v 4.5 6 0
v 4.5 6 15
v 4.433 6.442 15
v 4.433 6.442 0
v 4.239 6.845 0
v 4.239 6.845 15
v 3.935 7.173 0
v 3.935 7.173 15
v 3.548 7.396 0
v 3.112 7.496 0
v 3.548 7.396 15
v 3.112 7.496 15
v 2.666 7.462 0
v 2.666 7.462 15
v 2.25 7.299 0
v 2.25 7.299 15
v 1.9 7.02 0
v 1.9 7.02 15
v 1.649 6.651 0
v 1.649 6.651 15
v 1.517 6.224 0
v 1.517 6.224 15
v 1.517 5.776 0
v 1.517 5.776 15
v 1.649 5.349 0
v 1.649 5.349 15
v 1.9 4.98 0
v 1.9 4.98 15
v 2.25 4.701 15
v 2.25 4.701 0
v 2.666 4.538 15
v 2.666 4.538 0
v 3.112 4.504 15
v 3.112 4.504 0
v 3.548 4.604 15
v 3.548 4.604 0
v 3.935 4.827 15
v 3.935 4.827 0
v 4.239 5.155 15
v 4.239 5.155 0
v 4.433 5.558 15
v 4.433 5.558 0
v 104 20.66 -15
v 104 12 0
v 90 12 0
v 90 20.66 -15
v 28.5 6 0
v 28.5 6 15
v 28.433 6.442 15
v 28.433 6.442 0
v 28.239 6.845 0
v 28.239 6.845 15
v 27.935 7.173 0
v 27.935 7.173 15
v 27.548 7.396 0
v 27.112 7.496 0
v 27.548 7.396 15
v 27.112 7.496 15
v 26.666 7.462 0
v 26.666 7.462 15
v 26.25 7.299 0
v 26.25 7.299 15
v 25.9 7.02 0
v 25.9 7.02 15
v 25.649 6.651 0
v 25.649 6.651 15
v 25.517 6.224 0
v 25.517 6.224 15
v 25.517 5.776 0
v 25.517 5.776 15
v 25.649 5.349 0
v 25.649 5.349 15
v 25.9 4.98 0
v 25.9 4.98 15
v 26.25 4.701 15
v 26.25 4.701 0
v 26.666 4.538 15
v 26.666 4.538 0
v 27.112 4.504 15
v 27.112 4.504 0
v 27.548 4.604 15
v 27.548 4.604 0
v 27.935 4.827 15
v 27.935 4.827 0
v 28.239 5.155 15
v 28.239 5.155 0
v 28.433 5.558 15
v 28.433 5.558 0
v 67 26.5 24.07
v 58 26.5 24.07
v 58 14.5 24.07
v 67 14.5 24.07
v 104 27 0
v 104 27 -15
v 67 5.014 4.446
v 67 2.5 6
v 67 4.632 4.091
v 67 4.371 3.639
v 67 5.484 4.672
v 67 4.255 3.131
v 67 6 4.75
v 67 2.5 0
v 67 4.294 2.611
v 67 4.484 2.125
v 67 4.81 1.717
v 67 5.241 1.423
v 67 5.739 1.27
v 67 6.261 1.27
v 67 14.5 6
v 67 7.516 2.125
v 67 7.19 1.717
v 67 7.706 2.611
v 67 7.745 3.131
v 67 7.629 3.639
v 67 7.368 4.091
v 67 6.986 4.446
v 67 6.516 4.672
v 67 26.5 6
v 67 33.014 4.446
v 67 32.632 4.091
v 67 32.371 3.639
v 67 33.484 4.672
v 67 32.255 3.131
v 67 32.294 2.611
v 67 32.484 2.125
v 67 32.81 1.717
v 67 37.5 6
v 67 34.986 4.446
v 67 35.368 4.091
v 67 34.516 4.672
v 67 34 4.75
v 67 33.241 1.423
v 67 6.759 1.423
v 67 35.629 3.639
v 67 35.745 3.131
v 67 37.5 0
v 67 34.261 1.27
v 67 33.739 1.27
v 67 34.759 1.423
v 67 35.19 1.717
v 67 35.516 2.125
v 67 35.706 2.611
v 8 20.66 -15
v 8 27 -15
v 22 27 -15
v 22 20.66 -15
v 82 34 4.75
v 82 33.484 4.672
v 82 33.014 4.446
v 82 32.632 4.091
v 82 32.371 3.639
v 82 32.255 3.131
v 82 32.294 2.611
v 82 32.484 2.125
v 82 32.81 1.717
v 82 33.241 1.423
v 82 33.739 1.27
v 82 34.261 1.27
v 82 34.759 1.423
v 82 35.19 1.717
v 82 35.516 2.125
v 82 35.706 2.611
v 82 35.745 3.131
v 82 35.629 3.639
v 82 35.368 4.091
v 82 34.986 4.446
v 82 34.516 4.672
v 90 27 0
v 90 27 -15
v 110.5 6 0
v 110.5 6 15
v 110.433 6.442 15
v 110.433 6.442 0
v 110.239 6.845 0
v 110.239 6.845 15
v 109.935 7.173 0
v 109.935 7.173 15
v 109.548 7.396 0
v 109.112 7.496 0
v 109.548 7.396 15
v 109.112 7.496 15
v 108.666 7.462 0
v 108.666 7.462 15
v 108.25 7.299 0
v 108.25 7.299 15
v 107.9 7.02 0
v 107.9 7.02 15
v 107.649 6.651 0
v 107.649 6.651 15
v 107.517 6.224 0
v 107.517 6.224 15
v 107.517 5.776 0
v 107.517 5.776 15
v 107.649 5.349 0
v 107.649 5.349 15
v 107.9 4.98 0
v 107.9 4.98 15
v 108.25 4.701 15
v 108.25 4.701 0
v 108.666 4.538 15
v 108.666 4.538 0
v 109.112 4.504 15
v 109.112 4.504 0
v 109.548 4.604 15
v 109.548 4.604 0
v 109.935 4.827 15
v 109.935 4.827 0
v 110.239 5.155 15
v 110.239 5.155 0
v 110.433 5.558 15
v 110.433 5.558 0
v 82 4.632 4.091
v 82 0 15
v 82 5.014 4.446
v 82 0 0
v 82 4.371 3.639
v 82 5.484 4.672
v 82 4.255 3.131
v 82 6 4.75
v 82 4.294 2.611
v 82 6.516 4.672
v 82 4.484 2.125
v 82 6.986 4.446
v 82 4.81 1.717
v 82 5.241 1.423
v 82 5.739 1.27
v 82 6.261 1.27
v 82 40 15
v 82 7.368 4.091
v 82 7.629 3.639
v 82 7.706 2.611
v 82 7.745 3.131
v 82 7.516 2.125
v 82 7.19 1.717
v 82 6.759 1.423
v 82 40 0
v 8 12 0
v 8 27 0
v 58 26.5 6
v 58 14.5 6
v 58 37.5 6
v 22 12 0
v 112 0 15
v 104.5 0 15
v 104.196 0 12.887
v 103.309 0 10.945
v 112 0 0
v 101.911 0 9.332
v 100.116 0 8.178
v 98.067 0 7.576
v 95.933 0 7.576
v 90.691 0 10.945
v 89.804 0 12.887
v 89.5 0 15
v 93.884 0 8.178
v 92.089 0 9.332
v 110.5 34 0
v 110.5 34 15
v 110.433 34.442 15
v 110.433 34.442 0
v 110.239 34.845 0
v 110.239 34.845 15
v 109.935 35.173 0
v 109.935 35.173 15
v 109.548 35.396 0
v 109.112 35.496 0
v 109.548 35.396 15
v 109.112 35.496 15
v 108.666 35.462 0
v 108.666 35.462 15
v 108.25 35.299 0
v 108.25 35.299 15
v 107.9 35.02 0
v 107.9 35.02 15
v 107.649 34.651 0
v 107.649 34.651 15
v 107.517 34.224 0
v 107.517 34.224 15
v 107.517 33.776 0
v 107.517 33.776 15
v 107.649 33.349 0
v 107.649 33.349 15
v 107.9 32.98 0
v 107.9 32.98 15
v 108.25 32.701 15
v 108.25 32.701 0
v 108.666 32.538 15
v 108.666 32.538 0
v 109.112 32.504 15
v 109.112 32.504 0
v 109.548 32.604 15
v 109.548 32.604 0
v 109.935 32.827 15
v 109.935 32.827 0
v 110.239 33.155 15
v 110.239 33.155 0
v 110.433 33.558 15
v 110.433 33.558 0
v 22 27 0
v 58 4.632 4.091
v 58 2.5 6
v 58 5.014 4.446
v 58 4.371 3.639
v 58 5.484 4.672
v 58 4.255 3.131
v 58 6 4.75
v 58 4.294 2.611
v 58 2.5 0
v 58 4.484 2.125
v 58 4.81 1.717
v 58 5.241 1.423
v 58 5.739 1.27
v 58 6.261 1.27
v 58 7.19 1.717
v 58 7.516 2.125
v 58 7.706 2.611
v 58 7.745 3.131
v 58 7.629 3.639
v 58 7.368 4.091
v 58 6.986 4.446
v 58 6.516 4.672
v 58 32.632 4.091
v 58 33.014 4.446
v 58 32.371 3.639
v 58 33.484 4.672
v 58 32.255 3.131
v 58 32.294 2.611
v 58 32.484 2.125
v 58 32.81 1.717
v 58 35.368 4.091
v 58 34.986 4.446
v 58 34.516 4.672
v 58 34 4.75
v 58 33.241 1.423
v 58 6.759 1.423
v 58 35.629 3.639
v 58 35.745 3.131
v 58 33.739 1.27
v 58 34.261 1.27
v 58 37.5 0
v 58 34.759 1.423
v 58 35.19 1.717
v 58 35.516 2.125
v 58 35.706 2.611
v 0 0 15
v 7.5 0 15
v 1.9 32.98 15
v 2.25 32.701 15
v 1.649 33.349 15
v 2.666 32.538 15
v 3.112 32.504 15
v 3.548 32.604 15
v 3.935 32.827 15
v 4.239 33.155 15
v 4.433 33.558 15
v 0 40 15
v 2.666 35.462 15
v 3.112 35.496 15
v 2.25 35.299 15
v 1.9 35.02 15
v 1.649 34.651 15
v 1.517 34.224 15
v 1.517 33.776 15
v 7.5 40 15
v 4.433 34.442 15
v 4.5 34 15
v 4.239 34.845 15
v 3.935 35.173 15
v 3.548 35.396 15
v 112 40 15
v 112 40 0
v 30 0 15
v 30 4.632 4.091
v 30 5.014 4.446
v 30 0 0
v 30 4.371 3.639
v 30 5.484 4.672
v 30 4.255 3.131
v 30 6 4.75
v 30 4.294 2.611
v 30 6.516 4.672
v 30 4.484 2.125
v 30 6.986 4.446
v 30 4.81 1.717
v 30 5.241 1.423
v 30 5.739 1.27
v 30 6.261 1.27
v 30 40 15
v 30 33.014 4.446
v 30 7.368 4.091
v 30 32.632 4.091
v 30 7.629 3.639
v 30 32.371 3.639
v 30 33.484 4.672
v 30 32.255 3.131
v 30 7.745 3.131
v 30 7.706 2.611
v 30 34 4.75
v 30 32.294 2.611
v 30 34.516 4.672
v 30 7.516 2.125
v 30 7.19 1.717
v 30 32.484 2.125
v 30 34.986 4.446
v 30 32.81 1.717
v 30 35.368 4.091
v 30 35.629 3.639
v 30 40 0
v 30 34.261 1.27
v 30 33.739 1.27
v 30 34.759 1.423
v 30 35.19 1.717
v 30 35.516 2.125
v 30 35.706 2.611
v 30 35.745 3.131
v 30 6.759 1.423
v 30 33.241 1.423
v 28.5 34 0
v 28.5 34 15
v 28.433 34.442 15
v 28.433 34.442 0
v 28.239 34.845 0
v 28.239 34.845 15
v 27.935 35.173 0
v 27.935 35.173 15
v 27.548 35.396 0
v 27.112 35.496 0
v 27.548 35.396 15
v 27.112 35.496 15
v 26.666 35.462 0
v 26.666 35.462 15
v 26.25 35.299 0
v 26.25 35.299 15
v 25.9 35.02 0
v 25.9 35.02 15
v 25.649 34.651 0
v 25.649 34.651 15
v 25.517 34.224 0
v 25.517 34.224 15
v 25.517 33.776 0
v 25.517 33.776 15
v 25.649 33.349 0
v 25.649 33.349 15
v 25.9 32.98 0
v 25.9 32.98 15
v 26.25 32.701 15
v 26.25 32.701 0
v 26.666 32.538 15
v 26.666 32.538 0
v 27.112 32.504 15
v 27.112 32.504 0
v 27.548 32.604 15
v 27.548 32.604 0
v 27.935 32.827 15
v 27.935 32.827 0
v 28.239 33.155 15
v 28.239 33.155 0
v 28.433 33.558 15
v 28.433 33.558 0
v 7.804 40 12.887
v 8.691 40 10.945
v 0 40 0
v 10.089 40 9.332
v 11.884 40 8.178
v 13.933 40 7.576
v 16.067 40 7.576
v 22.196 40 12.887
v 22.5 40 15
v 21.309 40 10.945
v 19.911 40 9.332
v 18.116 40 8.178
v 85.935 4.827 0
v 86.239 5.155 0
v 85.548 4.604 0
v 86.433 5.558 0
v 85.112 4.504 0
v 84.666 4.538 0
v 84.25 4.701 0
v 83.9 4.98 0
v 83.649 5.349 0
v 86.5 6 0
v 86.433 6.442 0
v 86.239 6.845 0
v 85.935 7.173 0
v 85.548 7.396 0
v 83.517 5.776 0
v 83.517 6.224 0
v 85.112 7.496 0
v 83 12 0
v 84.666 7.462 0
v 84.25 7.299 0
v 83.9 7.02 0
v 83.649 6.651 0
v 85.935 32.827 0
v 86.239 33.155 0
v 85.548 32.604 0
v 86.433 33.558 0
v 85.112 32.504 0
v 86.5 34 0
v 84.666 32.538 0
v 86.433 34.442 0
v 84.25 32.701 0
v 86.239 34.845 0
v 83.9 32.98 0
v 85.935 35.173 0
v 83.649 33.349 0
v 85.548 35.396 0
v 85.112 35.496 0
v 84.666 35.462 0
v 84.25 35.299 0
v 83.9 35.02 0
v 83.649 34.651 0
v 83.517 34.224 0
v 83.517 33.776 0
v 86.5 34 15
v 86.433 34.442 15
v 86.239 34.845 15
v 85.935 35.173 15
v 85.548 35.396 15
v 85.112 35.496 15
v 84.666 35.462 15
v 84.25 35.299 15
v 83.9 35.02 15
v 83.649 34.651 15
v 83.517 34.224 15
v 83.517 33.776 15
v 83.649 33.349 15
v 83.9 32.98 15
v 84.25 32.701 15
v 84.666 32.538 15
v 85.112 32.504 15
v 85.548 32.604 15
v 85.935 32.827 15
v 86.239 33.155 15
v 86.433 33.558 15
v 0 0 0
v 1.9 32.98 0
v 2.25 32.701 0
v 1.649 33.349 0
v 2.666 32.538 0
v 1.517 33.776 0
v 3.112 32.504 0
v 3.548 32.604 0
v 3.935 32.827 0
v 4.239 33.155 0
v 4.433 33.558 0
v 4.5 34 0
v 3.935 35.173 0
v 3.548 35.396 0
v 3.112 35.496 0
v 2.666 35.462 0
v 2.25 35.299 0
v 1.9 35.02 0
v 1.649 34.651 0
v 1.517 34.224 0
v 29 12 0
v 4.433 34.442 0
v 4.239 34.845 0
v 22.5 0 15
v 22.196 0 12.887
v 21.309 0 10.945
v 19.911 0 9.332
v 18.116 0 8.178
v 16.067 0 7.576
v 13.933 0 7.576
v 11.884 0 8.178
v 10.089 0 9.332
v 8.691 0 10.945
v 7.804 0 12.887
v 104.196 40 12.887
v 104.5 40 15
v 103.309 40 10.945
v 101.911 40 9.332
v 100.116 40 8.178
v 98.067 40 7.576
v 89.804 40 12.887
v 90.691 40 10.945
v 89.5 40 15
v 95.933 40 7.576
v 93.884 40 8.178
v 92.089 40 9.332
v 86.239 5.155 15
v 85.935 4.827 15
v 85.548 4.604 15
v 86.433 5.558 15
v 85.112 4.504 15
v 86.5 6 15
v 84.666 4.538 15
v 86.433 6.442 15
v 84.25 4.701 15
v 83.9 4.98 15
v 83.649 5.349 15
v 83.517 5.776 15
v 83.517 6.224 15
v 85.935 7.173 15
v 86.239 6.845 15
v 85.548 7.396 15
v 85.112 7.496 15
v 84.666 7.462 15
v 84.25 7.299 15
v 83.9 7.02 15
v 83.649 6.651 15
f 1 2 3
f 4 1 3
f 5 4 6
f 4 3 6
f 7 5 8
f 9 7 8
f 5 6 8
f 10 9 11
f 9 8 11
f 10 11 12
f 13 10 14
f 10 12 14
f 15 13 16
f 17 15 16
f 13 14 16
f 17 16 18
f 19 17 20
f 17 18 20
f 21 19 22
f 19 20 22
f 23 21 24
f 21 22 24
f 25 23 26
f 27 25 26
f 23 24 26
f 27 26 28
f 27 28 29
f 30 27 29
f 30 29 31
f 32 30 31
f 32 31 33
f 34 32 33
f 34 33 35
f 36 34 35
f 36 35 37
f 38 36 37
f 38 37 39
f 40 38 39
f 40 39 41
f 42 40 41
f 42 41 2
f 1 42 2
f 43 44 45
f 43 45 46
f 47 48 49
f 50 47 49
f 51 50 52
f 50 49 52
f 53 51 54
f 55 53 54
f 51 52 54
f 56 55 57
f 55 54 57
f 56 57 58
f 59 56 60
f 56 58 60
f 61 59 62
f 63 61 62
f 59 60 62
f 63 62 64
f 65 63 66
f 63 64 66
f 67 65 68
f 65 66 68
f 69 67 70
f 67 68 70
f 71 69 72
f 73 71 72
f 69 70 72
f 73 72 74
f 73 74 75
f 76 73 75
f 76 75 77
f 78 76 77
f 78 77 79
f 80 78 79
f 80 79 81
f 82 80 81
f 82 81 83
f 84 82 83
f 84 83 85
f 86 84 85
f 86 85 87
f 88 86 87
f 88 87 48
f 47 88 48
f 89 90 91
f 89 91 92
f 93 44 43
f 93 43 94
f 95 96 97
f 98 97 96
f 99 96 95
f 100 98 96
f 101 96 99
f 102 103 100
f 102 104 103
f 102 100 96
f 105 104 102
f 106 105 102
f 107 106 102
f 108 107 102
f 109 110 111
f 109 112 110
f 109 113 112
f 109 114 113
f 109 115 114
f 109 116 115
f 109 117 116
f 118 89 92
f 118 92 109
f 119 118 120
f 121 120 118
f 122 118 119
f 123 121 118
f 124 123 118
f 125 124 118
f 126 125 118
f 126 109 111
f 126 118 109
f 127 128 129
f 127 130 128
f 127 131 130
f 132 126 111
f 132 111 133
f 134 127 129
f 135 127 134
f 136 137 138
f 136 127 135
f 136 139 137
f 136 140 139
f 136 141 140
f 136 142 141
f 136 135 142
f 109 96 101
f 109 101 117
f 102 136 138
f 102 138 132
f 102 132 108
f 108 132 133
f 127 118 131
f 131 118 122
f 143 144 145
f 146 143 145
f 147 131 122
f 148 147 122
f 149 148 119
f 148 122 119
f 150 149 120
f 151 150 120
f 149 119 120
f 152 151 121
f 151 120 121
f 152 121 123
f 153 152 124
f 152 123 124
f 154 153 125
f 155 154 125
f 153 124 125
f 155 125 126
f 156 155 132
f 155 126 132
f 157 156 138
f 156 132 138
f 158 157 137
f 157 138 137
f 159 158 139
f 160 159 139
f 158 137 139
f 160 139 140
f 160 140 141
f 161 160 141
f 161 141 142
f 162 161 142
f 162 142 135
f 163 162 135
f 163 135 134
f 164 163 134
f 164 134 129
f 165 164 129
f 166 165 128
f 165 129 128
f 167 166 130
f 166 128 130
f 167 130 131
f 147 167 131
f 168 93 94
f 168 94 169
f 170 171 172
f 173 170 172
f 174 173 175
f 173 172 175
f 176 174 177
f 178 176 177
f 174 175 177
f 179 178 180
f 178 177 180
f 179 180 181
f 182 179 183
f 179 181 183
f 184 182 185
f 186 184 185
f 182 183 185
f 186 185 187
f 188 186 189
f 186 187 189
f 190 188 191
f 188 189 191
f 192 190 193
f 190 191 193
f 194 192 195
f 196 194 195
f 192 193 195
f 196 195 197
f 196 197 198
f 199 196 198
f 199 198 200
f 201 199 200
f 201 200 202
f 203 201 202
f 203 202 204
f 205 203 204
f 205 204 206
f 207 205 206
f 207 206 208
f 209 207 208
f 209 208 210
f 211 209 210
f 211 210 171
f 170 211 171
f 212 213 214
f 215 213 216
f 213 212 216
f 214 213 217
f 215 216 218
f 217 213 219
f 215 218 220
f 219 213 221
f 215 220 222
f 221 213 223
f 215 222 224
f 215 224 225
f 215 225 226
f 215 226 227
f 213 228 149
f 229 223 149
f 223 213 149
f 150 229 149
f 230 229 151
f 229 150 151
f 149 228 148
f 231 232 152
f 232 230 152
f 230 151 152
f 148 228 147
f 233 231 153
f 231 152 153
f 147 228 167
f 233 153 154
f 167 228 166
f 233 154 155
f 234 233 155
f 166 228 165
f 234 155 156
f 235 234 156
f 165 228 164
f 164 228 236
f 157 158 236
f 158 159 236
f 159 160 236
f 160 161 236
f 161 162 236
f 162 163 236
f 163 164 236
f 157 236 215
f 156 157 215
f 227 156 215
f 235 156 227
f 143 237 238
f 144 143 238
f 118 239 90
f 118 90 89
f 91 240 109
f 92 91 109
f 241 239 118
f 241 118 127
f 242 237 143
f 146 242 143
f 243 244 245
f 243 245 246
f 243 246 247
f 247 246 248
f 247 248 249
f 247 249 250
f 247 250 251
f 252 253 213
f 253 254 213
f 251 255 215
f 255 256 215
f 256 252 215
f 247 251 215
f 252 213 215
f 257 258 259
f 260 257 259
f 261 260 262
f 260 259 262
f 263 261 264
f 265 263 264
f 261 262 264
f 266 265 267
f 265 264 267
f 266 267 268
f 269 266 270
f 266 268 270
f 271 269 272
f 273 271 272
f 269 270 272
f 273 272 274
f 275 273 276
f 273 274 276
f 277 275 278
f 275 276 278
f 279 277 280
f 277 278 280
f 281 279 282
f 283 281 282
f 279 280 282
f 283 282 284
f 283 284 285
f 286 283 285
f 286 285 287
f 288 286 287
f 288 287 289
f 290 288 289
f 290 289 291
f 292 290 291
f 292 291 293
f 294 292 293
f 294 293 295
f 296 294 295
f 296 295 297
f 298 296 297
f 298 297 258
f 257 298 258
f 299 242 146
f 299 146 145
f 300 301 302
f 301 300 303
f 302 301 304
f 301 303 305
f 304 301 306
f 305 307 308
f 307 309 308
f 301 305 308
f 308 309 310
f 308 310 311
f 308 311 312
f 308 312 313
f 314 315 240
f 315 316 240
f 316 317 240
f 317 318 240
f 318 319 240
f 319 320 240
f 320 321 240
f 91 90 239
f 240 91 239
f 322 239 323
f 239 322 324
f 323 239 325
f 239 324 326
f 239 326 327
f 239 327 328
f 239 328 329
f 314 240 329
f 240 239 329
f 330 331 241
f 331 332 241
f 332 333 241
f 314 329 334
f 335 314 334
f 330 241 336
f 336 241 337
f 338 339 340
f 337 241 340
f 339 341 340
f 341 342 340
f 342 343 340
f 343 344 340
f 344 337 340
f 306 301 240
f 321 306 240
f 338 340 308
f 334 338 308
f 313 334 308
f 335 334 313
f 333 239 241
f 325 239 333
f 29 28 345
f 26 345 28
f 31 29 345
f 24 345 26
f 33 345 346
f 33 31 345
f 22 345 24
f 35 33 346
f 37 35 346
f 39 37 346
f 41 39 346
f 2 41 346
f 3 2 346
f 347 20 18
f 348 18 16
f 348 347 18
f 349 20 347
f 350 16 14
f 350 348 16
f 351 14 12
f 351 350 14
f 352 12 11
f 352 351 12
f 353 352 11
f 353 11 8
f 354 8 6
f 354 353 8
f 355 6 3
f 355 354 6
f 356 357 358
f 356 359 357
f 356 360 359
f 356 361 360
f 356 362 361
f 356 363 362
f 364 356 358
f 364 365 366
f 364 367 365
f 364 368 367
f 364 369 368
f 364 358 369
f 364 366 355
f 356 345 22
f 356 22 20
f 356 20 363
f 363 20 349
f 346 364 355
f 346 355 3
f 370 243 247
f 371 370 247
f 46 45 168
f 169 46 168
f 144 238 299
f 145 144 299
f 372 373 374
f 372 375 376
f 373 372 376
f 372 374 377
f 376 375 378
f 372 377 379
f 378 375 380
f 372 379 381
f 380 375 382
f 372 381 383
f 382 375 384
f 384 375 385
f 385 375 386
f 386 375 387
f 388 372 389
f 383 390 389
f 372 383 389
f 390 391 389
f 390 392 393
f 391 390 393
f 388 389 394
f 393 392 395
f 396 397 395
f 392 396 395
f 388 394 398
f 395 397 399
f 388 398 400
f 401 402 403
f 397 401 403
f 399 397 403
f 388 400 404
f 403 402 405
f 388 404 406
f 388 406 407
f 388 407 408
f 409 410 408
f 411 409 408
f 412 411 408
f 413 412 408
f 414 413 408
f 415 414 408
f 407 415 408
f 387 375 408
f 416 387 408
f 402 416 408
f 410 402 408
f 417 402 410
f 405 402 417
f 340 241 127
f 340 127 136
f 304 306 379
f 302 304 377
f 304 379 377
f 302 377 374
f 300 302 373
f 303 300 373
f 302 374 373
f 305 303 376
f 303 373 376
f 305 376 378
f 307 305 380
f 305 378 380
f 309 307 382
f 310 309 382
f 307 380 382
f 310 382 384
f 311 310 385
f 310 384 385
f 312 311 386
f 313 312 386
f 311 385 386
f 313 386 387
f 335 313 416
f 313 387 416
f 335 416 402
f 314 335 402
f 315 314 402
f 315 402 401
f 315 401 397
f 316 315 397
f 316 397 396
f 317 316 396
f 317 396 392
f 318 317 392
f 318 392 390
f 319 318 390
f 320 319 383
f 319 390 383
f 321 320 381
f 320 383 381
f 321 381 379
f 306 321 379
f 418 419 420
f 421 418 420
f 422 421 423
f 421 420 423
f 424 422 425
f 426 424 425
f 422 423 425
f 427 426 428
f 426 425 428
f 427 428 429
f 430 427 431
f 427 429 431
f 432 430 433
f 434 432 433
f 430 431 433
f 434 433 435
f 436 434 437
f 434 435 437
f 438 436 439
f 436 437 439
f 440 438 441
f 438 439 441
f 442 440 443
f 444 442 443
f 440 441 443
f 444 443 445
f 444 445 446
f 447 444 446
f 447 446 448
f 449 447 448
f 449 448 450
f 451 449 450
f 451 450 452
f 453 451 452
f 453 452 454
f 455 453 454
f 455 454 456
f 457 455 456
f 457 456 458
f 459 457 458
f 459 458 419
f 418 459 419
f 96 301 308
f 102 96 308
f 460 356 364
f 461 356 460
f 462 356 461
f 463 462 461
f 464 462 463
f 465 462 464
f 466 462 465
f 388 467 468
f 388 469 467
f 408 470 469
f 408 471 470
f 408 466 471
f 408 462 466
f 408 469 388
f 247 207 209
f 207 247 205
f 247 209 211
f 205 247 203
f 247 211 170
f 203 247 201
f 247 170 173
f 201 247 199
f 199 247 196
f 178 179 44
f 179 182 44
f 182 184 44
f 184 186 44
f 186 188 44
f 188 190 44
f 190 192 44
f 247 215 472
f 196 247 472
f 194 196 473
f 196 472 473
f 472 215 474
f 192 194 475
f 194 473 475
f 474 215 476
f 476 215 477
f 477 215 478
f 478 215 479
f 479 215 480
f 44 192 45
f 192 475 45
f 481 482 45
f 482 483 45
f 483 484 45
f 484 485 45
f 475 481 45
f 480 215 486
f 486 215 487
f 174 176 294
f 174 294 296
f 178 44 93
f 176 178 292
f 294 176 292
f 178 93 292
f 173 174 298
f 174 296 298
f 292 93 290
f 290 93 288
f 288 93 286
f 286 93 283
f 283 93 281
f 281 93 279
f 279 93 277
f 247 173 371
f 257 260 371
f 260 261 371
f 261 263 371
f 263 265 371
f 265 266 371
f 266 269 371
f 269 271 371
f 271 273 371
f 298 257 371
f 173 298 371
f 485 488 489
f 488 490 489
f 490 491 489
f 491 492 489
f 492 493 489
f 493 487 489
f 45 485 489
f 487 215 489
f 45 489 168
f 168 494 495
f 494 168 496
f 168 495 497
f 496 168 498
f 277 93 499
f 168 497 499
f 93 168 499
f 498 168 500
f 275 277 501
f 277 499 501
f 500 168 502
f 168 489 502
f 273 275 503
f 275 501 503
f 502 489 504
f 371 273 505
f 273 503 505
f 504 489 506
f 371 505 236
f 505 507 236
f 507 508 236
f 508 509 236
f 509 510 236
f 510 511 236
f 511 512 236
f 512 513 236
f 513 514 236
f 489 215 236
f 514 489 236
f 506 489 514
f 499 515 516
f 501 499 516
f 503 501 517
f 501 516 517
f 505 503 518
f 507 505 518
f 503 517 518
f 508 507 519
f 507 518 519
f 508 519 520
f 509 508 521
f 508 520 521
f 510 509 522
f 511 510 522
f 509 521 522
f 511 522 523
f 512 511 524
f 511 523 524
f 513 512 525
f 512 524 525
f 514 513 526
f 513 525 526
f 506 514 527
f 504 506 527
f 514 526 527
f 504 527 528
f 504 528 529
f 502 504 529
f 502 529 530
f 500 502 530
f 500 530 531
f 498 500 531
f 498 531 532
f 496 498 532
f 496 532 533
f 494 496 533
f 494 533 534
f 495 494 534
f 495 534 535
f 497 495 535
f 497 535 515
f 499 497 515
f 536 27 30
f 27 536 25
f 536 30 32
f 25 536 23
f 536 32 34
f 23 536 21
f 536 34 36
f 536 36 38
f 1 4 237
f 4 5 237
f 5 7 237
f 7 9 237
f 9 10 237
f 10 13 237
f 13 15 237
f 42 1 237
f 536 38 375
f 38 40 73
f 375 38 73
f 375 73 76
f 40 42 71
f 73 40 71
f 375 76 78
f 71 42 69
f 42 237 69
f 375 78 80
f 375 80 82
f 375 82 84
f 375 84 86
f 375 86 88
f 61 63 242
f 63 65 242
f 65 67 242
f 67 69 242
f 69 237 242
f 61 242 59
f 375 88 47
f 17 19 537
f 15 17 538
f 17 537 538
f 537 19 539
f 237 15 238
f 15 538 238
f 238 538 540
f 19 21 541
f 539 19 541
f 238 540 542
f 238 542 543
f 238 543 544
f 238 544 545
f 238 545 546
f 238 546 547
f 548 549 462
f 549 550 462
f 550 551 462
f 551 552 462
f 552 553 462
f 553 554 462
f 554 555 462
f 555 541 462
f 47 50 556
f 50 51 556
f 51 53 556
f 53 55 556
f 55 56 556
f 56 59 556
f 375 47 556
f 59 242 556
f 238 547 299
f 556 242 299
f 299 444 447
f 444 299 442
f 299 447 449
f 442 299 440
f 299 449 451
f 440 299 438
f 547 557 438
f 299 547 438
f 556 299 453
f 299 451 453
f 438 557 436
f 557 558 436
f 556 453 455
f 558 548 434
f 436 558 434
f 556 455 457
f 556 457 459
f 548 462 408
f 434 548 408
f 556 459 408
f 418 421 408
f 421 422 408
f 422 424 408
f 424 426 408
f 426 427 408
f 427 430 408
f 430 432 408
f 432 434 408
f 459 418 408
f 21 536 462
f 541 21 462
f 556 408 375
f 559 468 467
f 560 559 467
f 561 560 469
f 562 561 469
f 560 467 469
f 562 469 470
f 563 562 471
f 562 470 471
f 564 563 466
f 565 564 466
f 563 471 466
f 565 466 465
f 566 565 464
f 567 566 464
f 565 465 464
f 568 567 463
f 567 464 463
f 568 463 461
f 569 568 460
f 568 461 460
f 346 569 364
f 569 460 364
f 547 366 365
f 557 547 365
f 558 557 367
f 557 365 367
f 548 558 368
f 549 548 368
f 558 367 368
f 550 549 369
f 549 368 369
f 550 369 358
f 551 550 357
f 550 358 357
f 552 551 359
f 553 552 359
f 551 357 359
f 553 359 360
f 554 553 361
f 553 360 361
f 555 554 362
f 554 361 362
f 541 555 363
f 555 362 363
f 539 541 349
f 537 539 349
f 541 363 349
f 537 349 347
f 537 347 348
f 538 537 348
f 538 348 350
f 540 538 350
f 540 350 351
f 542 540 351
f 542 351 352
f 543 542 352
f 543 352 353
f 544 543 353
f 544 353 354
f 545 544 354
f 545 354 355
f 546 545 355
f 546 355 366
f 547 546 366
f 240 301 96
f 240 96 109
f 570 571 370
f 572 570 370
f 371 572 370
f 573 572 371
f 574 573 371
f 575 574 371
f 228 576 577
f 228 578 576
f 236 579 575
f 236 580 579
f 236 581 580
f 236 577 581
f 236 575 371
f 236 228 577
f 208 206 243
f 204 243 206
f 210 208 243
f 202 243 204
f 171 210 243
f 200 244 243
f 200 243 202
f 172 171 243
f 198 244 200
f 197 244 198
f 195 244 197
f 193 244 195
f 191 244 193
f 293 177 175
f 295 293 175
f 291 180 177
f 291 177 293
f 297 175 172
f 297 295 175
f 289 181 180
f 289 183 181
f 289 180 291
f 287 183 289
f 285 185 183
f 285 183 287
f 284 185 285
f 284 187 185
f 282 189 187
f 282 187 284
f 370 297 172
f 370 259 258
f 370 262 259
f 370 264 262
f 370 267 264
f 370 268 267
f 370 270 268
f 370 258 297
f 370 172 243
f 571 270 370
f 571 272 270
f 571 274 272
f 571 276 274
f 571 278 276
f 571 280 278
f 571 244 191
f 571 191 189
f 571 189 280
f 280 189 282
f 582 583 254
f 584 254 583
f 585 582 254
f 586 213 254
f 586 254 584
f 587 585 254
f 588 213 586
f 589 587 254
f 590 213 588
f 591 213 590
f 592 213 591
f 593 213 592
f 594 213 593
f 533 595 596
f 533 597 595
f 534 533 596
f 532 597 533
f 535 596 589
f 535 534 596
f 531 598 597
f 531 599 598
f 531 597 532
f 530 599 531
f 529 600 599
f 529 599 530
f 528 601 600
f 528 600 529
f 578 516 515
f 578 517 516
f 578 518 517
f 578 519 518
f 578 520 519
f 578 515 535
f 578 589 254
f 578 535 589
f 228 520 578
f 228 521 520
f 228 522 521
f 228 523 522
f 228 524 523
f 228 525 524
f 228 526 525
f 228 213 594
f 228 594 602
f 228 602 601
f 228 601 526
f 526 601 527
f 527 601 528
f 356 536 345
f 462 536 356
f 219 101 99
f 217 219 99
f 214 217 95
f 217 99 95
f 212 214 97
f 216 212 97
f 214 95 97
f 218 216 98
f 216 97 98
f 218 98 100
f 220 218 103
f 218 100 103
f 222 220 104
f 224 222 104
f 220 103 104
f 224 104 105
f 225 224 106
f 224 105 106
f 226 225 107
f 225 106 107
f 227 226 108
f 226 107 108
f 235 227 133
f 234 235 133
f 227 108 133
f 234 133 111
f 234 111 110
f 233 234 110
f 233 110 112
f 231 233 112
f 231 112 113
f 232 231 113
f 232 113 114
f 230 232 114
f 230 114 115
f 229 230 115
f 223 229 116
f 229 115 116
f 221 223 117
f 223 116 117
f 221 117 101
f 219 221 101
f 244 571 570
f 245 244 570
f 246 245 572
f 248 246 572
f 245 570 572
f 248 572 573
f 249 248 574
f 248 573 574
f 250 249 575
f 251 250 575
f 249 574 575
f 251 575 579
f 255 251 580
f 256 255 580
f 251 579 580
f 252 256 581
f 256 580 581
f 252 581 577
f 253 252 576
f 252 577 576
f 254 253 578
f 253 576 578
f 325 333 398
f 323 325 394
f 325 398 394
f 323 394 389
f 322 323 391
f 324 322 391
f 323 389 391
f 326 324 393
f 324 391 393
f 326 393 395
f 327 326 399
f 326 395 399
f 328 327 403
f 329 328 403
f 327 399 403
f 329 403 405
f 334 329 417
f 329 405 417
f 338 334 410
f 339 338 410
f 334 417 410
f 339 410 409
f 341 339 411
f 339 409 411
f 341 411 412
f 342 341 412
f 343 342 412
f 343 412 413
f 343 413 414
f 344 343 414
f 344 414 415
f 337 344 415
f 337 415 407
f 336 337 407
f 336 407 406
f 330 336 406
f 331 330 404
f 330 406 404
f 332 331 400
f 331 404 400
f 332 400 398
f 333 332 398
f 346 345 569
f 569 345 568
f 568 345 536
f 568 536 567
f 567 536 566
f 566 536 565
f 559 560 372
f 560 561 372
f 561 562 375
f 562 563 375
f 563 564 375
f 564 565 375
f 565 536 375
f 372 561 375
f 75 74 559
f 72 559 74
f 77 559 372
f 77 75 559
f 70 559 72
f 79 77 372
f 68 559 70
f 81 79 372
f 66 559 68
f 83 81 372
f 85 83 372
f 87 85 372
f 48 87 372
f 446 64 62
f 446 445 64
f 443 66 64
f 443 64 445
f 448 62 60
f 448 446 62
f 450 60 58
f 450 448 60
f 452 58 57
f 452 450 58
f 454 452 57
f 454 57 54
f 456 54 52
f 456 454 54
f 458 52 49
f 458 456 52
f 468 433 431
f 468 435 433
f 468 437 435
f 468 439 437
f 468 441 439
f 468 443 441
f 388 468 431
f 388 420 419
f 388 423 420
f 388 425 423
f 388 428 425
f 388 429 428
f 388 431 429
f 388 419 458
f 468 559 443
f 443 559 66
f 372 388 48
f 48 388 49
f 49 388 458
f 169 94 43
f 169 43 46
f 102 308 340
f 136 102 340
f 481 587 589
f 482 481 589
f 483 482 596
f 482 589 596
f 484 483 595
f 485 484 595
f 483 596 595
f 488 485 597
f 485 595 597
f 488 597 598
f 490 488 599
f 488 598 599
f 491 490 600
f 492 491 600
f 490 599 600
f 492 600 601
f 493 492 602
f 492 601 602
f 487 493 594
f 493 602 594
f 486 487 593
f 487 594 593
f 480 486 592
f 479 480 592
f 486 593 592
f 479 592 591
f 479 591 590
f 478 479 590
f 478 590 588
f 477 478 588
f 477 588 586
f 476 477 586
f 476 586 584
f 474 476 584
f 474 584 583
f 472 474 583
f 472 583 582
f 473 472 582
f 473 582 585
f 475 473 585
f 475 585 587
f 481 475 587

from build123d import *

# Parameters (mm, degrees)
SKETCH1_W            = 30
SKETCH1_H            = 40
BOSS_EXTRUDE1_DEPTH  = 15
CUT_EXTRUDE1_DEPTH   = 49
SKETCH3_R            = 1.5
CUT_EXTRUDE2_DEPTH   = 49
SKETCH4_R            = 1.75
BOSS_EXTRUDE2_DEPTH  = 28
SKETCH5_W            = 6
SKETCH5_H            = 35
BOSS_EXTRUDE3_DEPTH  = 9
SKETCH6_R            = 1.75
BOSS_EXTRUDE4_DEPTH  = 15
SKETCH7_W            = 15
SKETCH7_H            = 40
BOSS_EXTRUDE6_DEPTH  = 30
CUT_EXTRUDE3_DEPTH   = 59
SKETCH10_R           = 1.5
CUT_EXTRUDE4_DEPTH   = 59
SKETCH14_W           = 14
SKETCH14_H           = 15
BOSS_EXTRUDE8_DEPTH  = 15
CUT_EXTRUDE7_DEPTH   = 21
SKETCH17_W           = 9
SKETCH17_H           = 12
BOSS_EXTRUDE10_DEPTH = 18.07


with BuildPart() as part:
    # Sketch1 → Boss-Extrude1 (new body)
    with BuildSketch(Plane.XY):
        with Locations((15, 20)):
            Rectangle(SKETCH1_W, SKETCH1_H)
    extrude(amount=BOSS_EXTRUDE1_DEPTH)

    # Sketch2 → Cut-Extrude1 (cut)
    with BuildSketch(Plane(origin=(0, 40, 0), x_dir=(1, 0, 0), z_dir=(0, 1, 0))):
        with BuildLine():
            Line((7.5, -15), (22.5, -15))
            ThreePointArc((22.5, -15), (15, -7.5), (7.5, -15))
        make_face()
    extrude(amount=-CUT_EXTRUDE1_DEPTH, mode=Mode.SUBTRACT)

    # Sketch3 → Cut-Extrude2 (cut)
    with BuildSketch(Plane.XY.offset(15)):
        with Locations((3, 34)):
            Circle(SKETCH3_R)
        with Locations((3, 6)):
            Circle(SKETCH3_R)
        with Locations((27, 34)):
            Circle(SKETCH3_R)
        with Locations((27, 6)):
            Circle(SKETCH3_R)
    extrude(amount=-CUT_EXTRUDE2_DEPTH, mode=Mode.SUBTRACT)

    # Sketch4 → Boss-Extrude2 (add)
    with BuildSketch(Plane(origin=(30, 0, 0), x_dir=(0, 0, -1), z_dir=(1, 0, 0))):
        with Locations(Location((-3, 34, 0), (0, 0, 180))):
            Circle(SKETCH4_R)
        with Locations(Location((-3, 6, 0), (0, 0, 180))):
            Circle(SKETCH4_R)
    extrude(amount=BOSS_EXTRUDE2_DEPTH)

    # Sketch5 → Boss-Extrude3 (add)
    with BuildSketch(Plane(origin=(58, 0, 0), x_dir=(0, 0, -1), z_dir=(1, 0, 0))):
        with Locations((-3, 20)):
            Rectangle(SKETCH5_W, SKETCH5_H)
    extrude(amount=BOSS_EXTRUDE3_DEPTH)

    # Sketch6 → Boss-Extrude4 (add)
    with BuildSketch(Plane(origin=(67, 0, 0), x_dir=(0, 0, -1), z_dir=(1, 0, 0))):
        with Locations(Location((-3, 34, 0), (0, 0, 180))):
            Circle(SKETCH6_R)
        with Locations(Location((-3, 6, 0), (0, 0, 180))):
            Circle(SKETCH6_R)
    extrude(amount=BOSS_EXTRUDE4_DEPTH)

    # Sketch7 → Boss-Extrude6 (add)
    with BuildSketch(Plane(origin=(82, 0, 0), x_dir=(0, 0, -1), z_dir=(1, 0, 0))):
        with Locations((-7.5, 20)):
            Rectangle(SKETCH7_W, SKETCH7_H)
    extrude(amount=BOSS_EXTRUDE6_DEPTH)

    # Sketch9 → Cut-Extrude3 (cut)
    with BuildSketch(Plane(origin=(0, 40, 0), x_dir=(1, 0, 0), z_dir=(0, 1, 0))):
        with BuildLine():
            Line((89.5, -15), (104.5, -15))
            ThreePointArc((104.5, -15), (97, -7.5), (89.5, -15))
        make_face()
    extrude(amount=-CUT_EXTRUDE3_DEPTH, mode=Mode.SUBTRACT)

    # Sketch10 → Cut-Extrude4 (cut)
    with BuildSketch(Plane.XY.offset(15)):
        with Locations((85, 34)):
            Circle(SKETCH10_R)
        with Locations((109, 34)):
            Circle(SKETCH10_R)
        with Locations((109, 6)):
            Circle(SKETCH10_R)
        with Locations((85, 6)):
            Circle(SKETCH10_R)
    extrude(amount=-CUT_EXTRUDE4_DEPTH, mode=Mode.SUBTRACT)

    # Sketch14 → Boss-Extrude8 (add)
    with BuildSketch(Plane(origin=(0, 0, 0), x_dir=(-1, 0, 0), z_dir=(0, 0, -1))):
        with Locations((-97, 19.5)):
            Rectangle(SKETCH14_W, SKETCH14_H)
    boss_extrude8 = extrude(amount=BOSS_EXTRUDE8_DEPTH)

    # Sketch15 → Cut-Extrude7 (cut)
    with BuildSketch(Plane(origin=(104, 0, 0), x_dir=(0, 0, -1), z_dir=(1, 0, 0))):
        Polygon((0, 12), (15, 20.660254038), (15, 12), align=None)
    cut_extrude7 = extrude(amount=-CUT_EXTRUDE7_DEPTH, mode=Mode.SUBTRACT)

    # Mirror1: Boss-Extrude8, Cut-Extrude7 across plane
    add(boss_extrude8.mirror(Plane(origin=(56, 0, 0), x_dir=(0, 0, 1), z_dir=(1, 0, 0))))
    add(cut_extrude7.mirror(Plane(origin=(56, 0, 0), x_dir=(0, 0, 1), z_dir=(1, 0, 0))), mode=Mode.SUBTRACT)

    # Sketch17 → Boss-Extrude10 (add)
    with BuildSketch(Plane.XY.offset(6)):
        with Locations((62.5, 20.5)):
            Rectangle(SKETCH17_W, SKETCH17_H)
    extrude(amount=BOSS_EXTRUDE10_DEPTH)


solid = part.part
